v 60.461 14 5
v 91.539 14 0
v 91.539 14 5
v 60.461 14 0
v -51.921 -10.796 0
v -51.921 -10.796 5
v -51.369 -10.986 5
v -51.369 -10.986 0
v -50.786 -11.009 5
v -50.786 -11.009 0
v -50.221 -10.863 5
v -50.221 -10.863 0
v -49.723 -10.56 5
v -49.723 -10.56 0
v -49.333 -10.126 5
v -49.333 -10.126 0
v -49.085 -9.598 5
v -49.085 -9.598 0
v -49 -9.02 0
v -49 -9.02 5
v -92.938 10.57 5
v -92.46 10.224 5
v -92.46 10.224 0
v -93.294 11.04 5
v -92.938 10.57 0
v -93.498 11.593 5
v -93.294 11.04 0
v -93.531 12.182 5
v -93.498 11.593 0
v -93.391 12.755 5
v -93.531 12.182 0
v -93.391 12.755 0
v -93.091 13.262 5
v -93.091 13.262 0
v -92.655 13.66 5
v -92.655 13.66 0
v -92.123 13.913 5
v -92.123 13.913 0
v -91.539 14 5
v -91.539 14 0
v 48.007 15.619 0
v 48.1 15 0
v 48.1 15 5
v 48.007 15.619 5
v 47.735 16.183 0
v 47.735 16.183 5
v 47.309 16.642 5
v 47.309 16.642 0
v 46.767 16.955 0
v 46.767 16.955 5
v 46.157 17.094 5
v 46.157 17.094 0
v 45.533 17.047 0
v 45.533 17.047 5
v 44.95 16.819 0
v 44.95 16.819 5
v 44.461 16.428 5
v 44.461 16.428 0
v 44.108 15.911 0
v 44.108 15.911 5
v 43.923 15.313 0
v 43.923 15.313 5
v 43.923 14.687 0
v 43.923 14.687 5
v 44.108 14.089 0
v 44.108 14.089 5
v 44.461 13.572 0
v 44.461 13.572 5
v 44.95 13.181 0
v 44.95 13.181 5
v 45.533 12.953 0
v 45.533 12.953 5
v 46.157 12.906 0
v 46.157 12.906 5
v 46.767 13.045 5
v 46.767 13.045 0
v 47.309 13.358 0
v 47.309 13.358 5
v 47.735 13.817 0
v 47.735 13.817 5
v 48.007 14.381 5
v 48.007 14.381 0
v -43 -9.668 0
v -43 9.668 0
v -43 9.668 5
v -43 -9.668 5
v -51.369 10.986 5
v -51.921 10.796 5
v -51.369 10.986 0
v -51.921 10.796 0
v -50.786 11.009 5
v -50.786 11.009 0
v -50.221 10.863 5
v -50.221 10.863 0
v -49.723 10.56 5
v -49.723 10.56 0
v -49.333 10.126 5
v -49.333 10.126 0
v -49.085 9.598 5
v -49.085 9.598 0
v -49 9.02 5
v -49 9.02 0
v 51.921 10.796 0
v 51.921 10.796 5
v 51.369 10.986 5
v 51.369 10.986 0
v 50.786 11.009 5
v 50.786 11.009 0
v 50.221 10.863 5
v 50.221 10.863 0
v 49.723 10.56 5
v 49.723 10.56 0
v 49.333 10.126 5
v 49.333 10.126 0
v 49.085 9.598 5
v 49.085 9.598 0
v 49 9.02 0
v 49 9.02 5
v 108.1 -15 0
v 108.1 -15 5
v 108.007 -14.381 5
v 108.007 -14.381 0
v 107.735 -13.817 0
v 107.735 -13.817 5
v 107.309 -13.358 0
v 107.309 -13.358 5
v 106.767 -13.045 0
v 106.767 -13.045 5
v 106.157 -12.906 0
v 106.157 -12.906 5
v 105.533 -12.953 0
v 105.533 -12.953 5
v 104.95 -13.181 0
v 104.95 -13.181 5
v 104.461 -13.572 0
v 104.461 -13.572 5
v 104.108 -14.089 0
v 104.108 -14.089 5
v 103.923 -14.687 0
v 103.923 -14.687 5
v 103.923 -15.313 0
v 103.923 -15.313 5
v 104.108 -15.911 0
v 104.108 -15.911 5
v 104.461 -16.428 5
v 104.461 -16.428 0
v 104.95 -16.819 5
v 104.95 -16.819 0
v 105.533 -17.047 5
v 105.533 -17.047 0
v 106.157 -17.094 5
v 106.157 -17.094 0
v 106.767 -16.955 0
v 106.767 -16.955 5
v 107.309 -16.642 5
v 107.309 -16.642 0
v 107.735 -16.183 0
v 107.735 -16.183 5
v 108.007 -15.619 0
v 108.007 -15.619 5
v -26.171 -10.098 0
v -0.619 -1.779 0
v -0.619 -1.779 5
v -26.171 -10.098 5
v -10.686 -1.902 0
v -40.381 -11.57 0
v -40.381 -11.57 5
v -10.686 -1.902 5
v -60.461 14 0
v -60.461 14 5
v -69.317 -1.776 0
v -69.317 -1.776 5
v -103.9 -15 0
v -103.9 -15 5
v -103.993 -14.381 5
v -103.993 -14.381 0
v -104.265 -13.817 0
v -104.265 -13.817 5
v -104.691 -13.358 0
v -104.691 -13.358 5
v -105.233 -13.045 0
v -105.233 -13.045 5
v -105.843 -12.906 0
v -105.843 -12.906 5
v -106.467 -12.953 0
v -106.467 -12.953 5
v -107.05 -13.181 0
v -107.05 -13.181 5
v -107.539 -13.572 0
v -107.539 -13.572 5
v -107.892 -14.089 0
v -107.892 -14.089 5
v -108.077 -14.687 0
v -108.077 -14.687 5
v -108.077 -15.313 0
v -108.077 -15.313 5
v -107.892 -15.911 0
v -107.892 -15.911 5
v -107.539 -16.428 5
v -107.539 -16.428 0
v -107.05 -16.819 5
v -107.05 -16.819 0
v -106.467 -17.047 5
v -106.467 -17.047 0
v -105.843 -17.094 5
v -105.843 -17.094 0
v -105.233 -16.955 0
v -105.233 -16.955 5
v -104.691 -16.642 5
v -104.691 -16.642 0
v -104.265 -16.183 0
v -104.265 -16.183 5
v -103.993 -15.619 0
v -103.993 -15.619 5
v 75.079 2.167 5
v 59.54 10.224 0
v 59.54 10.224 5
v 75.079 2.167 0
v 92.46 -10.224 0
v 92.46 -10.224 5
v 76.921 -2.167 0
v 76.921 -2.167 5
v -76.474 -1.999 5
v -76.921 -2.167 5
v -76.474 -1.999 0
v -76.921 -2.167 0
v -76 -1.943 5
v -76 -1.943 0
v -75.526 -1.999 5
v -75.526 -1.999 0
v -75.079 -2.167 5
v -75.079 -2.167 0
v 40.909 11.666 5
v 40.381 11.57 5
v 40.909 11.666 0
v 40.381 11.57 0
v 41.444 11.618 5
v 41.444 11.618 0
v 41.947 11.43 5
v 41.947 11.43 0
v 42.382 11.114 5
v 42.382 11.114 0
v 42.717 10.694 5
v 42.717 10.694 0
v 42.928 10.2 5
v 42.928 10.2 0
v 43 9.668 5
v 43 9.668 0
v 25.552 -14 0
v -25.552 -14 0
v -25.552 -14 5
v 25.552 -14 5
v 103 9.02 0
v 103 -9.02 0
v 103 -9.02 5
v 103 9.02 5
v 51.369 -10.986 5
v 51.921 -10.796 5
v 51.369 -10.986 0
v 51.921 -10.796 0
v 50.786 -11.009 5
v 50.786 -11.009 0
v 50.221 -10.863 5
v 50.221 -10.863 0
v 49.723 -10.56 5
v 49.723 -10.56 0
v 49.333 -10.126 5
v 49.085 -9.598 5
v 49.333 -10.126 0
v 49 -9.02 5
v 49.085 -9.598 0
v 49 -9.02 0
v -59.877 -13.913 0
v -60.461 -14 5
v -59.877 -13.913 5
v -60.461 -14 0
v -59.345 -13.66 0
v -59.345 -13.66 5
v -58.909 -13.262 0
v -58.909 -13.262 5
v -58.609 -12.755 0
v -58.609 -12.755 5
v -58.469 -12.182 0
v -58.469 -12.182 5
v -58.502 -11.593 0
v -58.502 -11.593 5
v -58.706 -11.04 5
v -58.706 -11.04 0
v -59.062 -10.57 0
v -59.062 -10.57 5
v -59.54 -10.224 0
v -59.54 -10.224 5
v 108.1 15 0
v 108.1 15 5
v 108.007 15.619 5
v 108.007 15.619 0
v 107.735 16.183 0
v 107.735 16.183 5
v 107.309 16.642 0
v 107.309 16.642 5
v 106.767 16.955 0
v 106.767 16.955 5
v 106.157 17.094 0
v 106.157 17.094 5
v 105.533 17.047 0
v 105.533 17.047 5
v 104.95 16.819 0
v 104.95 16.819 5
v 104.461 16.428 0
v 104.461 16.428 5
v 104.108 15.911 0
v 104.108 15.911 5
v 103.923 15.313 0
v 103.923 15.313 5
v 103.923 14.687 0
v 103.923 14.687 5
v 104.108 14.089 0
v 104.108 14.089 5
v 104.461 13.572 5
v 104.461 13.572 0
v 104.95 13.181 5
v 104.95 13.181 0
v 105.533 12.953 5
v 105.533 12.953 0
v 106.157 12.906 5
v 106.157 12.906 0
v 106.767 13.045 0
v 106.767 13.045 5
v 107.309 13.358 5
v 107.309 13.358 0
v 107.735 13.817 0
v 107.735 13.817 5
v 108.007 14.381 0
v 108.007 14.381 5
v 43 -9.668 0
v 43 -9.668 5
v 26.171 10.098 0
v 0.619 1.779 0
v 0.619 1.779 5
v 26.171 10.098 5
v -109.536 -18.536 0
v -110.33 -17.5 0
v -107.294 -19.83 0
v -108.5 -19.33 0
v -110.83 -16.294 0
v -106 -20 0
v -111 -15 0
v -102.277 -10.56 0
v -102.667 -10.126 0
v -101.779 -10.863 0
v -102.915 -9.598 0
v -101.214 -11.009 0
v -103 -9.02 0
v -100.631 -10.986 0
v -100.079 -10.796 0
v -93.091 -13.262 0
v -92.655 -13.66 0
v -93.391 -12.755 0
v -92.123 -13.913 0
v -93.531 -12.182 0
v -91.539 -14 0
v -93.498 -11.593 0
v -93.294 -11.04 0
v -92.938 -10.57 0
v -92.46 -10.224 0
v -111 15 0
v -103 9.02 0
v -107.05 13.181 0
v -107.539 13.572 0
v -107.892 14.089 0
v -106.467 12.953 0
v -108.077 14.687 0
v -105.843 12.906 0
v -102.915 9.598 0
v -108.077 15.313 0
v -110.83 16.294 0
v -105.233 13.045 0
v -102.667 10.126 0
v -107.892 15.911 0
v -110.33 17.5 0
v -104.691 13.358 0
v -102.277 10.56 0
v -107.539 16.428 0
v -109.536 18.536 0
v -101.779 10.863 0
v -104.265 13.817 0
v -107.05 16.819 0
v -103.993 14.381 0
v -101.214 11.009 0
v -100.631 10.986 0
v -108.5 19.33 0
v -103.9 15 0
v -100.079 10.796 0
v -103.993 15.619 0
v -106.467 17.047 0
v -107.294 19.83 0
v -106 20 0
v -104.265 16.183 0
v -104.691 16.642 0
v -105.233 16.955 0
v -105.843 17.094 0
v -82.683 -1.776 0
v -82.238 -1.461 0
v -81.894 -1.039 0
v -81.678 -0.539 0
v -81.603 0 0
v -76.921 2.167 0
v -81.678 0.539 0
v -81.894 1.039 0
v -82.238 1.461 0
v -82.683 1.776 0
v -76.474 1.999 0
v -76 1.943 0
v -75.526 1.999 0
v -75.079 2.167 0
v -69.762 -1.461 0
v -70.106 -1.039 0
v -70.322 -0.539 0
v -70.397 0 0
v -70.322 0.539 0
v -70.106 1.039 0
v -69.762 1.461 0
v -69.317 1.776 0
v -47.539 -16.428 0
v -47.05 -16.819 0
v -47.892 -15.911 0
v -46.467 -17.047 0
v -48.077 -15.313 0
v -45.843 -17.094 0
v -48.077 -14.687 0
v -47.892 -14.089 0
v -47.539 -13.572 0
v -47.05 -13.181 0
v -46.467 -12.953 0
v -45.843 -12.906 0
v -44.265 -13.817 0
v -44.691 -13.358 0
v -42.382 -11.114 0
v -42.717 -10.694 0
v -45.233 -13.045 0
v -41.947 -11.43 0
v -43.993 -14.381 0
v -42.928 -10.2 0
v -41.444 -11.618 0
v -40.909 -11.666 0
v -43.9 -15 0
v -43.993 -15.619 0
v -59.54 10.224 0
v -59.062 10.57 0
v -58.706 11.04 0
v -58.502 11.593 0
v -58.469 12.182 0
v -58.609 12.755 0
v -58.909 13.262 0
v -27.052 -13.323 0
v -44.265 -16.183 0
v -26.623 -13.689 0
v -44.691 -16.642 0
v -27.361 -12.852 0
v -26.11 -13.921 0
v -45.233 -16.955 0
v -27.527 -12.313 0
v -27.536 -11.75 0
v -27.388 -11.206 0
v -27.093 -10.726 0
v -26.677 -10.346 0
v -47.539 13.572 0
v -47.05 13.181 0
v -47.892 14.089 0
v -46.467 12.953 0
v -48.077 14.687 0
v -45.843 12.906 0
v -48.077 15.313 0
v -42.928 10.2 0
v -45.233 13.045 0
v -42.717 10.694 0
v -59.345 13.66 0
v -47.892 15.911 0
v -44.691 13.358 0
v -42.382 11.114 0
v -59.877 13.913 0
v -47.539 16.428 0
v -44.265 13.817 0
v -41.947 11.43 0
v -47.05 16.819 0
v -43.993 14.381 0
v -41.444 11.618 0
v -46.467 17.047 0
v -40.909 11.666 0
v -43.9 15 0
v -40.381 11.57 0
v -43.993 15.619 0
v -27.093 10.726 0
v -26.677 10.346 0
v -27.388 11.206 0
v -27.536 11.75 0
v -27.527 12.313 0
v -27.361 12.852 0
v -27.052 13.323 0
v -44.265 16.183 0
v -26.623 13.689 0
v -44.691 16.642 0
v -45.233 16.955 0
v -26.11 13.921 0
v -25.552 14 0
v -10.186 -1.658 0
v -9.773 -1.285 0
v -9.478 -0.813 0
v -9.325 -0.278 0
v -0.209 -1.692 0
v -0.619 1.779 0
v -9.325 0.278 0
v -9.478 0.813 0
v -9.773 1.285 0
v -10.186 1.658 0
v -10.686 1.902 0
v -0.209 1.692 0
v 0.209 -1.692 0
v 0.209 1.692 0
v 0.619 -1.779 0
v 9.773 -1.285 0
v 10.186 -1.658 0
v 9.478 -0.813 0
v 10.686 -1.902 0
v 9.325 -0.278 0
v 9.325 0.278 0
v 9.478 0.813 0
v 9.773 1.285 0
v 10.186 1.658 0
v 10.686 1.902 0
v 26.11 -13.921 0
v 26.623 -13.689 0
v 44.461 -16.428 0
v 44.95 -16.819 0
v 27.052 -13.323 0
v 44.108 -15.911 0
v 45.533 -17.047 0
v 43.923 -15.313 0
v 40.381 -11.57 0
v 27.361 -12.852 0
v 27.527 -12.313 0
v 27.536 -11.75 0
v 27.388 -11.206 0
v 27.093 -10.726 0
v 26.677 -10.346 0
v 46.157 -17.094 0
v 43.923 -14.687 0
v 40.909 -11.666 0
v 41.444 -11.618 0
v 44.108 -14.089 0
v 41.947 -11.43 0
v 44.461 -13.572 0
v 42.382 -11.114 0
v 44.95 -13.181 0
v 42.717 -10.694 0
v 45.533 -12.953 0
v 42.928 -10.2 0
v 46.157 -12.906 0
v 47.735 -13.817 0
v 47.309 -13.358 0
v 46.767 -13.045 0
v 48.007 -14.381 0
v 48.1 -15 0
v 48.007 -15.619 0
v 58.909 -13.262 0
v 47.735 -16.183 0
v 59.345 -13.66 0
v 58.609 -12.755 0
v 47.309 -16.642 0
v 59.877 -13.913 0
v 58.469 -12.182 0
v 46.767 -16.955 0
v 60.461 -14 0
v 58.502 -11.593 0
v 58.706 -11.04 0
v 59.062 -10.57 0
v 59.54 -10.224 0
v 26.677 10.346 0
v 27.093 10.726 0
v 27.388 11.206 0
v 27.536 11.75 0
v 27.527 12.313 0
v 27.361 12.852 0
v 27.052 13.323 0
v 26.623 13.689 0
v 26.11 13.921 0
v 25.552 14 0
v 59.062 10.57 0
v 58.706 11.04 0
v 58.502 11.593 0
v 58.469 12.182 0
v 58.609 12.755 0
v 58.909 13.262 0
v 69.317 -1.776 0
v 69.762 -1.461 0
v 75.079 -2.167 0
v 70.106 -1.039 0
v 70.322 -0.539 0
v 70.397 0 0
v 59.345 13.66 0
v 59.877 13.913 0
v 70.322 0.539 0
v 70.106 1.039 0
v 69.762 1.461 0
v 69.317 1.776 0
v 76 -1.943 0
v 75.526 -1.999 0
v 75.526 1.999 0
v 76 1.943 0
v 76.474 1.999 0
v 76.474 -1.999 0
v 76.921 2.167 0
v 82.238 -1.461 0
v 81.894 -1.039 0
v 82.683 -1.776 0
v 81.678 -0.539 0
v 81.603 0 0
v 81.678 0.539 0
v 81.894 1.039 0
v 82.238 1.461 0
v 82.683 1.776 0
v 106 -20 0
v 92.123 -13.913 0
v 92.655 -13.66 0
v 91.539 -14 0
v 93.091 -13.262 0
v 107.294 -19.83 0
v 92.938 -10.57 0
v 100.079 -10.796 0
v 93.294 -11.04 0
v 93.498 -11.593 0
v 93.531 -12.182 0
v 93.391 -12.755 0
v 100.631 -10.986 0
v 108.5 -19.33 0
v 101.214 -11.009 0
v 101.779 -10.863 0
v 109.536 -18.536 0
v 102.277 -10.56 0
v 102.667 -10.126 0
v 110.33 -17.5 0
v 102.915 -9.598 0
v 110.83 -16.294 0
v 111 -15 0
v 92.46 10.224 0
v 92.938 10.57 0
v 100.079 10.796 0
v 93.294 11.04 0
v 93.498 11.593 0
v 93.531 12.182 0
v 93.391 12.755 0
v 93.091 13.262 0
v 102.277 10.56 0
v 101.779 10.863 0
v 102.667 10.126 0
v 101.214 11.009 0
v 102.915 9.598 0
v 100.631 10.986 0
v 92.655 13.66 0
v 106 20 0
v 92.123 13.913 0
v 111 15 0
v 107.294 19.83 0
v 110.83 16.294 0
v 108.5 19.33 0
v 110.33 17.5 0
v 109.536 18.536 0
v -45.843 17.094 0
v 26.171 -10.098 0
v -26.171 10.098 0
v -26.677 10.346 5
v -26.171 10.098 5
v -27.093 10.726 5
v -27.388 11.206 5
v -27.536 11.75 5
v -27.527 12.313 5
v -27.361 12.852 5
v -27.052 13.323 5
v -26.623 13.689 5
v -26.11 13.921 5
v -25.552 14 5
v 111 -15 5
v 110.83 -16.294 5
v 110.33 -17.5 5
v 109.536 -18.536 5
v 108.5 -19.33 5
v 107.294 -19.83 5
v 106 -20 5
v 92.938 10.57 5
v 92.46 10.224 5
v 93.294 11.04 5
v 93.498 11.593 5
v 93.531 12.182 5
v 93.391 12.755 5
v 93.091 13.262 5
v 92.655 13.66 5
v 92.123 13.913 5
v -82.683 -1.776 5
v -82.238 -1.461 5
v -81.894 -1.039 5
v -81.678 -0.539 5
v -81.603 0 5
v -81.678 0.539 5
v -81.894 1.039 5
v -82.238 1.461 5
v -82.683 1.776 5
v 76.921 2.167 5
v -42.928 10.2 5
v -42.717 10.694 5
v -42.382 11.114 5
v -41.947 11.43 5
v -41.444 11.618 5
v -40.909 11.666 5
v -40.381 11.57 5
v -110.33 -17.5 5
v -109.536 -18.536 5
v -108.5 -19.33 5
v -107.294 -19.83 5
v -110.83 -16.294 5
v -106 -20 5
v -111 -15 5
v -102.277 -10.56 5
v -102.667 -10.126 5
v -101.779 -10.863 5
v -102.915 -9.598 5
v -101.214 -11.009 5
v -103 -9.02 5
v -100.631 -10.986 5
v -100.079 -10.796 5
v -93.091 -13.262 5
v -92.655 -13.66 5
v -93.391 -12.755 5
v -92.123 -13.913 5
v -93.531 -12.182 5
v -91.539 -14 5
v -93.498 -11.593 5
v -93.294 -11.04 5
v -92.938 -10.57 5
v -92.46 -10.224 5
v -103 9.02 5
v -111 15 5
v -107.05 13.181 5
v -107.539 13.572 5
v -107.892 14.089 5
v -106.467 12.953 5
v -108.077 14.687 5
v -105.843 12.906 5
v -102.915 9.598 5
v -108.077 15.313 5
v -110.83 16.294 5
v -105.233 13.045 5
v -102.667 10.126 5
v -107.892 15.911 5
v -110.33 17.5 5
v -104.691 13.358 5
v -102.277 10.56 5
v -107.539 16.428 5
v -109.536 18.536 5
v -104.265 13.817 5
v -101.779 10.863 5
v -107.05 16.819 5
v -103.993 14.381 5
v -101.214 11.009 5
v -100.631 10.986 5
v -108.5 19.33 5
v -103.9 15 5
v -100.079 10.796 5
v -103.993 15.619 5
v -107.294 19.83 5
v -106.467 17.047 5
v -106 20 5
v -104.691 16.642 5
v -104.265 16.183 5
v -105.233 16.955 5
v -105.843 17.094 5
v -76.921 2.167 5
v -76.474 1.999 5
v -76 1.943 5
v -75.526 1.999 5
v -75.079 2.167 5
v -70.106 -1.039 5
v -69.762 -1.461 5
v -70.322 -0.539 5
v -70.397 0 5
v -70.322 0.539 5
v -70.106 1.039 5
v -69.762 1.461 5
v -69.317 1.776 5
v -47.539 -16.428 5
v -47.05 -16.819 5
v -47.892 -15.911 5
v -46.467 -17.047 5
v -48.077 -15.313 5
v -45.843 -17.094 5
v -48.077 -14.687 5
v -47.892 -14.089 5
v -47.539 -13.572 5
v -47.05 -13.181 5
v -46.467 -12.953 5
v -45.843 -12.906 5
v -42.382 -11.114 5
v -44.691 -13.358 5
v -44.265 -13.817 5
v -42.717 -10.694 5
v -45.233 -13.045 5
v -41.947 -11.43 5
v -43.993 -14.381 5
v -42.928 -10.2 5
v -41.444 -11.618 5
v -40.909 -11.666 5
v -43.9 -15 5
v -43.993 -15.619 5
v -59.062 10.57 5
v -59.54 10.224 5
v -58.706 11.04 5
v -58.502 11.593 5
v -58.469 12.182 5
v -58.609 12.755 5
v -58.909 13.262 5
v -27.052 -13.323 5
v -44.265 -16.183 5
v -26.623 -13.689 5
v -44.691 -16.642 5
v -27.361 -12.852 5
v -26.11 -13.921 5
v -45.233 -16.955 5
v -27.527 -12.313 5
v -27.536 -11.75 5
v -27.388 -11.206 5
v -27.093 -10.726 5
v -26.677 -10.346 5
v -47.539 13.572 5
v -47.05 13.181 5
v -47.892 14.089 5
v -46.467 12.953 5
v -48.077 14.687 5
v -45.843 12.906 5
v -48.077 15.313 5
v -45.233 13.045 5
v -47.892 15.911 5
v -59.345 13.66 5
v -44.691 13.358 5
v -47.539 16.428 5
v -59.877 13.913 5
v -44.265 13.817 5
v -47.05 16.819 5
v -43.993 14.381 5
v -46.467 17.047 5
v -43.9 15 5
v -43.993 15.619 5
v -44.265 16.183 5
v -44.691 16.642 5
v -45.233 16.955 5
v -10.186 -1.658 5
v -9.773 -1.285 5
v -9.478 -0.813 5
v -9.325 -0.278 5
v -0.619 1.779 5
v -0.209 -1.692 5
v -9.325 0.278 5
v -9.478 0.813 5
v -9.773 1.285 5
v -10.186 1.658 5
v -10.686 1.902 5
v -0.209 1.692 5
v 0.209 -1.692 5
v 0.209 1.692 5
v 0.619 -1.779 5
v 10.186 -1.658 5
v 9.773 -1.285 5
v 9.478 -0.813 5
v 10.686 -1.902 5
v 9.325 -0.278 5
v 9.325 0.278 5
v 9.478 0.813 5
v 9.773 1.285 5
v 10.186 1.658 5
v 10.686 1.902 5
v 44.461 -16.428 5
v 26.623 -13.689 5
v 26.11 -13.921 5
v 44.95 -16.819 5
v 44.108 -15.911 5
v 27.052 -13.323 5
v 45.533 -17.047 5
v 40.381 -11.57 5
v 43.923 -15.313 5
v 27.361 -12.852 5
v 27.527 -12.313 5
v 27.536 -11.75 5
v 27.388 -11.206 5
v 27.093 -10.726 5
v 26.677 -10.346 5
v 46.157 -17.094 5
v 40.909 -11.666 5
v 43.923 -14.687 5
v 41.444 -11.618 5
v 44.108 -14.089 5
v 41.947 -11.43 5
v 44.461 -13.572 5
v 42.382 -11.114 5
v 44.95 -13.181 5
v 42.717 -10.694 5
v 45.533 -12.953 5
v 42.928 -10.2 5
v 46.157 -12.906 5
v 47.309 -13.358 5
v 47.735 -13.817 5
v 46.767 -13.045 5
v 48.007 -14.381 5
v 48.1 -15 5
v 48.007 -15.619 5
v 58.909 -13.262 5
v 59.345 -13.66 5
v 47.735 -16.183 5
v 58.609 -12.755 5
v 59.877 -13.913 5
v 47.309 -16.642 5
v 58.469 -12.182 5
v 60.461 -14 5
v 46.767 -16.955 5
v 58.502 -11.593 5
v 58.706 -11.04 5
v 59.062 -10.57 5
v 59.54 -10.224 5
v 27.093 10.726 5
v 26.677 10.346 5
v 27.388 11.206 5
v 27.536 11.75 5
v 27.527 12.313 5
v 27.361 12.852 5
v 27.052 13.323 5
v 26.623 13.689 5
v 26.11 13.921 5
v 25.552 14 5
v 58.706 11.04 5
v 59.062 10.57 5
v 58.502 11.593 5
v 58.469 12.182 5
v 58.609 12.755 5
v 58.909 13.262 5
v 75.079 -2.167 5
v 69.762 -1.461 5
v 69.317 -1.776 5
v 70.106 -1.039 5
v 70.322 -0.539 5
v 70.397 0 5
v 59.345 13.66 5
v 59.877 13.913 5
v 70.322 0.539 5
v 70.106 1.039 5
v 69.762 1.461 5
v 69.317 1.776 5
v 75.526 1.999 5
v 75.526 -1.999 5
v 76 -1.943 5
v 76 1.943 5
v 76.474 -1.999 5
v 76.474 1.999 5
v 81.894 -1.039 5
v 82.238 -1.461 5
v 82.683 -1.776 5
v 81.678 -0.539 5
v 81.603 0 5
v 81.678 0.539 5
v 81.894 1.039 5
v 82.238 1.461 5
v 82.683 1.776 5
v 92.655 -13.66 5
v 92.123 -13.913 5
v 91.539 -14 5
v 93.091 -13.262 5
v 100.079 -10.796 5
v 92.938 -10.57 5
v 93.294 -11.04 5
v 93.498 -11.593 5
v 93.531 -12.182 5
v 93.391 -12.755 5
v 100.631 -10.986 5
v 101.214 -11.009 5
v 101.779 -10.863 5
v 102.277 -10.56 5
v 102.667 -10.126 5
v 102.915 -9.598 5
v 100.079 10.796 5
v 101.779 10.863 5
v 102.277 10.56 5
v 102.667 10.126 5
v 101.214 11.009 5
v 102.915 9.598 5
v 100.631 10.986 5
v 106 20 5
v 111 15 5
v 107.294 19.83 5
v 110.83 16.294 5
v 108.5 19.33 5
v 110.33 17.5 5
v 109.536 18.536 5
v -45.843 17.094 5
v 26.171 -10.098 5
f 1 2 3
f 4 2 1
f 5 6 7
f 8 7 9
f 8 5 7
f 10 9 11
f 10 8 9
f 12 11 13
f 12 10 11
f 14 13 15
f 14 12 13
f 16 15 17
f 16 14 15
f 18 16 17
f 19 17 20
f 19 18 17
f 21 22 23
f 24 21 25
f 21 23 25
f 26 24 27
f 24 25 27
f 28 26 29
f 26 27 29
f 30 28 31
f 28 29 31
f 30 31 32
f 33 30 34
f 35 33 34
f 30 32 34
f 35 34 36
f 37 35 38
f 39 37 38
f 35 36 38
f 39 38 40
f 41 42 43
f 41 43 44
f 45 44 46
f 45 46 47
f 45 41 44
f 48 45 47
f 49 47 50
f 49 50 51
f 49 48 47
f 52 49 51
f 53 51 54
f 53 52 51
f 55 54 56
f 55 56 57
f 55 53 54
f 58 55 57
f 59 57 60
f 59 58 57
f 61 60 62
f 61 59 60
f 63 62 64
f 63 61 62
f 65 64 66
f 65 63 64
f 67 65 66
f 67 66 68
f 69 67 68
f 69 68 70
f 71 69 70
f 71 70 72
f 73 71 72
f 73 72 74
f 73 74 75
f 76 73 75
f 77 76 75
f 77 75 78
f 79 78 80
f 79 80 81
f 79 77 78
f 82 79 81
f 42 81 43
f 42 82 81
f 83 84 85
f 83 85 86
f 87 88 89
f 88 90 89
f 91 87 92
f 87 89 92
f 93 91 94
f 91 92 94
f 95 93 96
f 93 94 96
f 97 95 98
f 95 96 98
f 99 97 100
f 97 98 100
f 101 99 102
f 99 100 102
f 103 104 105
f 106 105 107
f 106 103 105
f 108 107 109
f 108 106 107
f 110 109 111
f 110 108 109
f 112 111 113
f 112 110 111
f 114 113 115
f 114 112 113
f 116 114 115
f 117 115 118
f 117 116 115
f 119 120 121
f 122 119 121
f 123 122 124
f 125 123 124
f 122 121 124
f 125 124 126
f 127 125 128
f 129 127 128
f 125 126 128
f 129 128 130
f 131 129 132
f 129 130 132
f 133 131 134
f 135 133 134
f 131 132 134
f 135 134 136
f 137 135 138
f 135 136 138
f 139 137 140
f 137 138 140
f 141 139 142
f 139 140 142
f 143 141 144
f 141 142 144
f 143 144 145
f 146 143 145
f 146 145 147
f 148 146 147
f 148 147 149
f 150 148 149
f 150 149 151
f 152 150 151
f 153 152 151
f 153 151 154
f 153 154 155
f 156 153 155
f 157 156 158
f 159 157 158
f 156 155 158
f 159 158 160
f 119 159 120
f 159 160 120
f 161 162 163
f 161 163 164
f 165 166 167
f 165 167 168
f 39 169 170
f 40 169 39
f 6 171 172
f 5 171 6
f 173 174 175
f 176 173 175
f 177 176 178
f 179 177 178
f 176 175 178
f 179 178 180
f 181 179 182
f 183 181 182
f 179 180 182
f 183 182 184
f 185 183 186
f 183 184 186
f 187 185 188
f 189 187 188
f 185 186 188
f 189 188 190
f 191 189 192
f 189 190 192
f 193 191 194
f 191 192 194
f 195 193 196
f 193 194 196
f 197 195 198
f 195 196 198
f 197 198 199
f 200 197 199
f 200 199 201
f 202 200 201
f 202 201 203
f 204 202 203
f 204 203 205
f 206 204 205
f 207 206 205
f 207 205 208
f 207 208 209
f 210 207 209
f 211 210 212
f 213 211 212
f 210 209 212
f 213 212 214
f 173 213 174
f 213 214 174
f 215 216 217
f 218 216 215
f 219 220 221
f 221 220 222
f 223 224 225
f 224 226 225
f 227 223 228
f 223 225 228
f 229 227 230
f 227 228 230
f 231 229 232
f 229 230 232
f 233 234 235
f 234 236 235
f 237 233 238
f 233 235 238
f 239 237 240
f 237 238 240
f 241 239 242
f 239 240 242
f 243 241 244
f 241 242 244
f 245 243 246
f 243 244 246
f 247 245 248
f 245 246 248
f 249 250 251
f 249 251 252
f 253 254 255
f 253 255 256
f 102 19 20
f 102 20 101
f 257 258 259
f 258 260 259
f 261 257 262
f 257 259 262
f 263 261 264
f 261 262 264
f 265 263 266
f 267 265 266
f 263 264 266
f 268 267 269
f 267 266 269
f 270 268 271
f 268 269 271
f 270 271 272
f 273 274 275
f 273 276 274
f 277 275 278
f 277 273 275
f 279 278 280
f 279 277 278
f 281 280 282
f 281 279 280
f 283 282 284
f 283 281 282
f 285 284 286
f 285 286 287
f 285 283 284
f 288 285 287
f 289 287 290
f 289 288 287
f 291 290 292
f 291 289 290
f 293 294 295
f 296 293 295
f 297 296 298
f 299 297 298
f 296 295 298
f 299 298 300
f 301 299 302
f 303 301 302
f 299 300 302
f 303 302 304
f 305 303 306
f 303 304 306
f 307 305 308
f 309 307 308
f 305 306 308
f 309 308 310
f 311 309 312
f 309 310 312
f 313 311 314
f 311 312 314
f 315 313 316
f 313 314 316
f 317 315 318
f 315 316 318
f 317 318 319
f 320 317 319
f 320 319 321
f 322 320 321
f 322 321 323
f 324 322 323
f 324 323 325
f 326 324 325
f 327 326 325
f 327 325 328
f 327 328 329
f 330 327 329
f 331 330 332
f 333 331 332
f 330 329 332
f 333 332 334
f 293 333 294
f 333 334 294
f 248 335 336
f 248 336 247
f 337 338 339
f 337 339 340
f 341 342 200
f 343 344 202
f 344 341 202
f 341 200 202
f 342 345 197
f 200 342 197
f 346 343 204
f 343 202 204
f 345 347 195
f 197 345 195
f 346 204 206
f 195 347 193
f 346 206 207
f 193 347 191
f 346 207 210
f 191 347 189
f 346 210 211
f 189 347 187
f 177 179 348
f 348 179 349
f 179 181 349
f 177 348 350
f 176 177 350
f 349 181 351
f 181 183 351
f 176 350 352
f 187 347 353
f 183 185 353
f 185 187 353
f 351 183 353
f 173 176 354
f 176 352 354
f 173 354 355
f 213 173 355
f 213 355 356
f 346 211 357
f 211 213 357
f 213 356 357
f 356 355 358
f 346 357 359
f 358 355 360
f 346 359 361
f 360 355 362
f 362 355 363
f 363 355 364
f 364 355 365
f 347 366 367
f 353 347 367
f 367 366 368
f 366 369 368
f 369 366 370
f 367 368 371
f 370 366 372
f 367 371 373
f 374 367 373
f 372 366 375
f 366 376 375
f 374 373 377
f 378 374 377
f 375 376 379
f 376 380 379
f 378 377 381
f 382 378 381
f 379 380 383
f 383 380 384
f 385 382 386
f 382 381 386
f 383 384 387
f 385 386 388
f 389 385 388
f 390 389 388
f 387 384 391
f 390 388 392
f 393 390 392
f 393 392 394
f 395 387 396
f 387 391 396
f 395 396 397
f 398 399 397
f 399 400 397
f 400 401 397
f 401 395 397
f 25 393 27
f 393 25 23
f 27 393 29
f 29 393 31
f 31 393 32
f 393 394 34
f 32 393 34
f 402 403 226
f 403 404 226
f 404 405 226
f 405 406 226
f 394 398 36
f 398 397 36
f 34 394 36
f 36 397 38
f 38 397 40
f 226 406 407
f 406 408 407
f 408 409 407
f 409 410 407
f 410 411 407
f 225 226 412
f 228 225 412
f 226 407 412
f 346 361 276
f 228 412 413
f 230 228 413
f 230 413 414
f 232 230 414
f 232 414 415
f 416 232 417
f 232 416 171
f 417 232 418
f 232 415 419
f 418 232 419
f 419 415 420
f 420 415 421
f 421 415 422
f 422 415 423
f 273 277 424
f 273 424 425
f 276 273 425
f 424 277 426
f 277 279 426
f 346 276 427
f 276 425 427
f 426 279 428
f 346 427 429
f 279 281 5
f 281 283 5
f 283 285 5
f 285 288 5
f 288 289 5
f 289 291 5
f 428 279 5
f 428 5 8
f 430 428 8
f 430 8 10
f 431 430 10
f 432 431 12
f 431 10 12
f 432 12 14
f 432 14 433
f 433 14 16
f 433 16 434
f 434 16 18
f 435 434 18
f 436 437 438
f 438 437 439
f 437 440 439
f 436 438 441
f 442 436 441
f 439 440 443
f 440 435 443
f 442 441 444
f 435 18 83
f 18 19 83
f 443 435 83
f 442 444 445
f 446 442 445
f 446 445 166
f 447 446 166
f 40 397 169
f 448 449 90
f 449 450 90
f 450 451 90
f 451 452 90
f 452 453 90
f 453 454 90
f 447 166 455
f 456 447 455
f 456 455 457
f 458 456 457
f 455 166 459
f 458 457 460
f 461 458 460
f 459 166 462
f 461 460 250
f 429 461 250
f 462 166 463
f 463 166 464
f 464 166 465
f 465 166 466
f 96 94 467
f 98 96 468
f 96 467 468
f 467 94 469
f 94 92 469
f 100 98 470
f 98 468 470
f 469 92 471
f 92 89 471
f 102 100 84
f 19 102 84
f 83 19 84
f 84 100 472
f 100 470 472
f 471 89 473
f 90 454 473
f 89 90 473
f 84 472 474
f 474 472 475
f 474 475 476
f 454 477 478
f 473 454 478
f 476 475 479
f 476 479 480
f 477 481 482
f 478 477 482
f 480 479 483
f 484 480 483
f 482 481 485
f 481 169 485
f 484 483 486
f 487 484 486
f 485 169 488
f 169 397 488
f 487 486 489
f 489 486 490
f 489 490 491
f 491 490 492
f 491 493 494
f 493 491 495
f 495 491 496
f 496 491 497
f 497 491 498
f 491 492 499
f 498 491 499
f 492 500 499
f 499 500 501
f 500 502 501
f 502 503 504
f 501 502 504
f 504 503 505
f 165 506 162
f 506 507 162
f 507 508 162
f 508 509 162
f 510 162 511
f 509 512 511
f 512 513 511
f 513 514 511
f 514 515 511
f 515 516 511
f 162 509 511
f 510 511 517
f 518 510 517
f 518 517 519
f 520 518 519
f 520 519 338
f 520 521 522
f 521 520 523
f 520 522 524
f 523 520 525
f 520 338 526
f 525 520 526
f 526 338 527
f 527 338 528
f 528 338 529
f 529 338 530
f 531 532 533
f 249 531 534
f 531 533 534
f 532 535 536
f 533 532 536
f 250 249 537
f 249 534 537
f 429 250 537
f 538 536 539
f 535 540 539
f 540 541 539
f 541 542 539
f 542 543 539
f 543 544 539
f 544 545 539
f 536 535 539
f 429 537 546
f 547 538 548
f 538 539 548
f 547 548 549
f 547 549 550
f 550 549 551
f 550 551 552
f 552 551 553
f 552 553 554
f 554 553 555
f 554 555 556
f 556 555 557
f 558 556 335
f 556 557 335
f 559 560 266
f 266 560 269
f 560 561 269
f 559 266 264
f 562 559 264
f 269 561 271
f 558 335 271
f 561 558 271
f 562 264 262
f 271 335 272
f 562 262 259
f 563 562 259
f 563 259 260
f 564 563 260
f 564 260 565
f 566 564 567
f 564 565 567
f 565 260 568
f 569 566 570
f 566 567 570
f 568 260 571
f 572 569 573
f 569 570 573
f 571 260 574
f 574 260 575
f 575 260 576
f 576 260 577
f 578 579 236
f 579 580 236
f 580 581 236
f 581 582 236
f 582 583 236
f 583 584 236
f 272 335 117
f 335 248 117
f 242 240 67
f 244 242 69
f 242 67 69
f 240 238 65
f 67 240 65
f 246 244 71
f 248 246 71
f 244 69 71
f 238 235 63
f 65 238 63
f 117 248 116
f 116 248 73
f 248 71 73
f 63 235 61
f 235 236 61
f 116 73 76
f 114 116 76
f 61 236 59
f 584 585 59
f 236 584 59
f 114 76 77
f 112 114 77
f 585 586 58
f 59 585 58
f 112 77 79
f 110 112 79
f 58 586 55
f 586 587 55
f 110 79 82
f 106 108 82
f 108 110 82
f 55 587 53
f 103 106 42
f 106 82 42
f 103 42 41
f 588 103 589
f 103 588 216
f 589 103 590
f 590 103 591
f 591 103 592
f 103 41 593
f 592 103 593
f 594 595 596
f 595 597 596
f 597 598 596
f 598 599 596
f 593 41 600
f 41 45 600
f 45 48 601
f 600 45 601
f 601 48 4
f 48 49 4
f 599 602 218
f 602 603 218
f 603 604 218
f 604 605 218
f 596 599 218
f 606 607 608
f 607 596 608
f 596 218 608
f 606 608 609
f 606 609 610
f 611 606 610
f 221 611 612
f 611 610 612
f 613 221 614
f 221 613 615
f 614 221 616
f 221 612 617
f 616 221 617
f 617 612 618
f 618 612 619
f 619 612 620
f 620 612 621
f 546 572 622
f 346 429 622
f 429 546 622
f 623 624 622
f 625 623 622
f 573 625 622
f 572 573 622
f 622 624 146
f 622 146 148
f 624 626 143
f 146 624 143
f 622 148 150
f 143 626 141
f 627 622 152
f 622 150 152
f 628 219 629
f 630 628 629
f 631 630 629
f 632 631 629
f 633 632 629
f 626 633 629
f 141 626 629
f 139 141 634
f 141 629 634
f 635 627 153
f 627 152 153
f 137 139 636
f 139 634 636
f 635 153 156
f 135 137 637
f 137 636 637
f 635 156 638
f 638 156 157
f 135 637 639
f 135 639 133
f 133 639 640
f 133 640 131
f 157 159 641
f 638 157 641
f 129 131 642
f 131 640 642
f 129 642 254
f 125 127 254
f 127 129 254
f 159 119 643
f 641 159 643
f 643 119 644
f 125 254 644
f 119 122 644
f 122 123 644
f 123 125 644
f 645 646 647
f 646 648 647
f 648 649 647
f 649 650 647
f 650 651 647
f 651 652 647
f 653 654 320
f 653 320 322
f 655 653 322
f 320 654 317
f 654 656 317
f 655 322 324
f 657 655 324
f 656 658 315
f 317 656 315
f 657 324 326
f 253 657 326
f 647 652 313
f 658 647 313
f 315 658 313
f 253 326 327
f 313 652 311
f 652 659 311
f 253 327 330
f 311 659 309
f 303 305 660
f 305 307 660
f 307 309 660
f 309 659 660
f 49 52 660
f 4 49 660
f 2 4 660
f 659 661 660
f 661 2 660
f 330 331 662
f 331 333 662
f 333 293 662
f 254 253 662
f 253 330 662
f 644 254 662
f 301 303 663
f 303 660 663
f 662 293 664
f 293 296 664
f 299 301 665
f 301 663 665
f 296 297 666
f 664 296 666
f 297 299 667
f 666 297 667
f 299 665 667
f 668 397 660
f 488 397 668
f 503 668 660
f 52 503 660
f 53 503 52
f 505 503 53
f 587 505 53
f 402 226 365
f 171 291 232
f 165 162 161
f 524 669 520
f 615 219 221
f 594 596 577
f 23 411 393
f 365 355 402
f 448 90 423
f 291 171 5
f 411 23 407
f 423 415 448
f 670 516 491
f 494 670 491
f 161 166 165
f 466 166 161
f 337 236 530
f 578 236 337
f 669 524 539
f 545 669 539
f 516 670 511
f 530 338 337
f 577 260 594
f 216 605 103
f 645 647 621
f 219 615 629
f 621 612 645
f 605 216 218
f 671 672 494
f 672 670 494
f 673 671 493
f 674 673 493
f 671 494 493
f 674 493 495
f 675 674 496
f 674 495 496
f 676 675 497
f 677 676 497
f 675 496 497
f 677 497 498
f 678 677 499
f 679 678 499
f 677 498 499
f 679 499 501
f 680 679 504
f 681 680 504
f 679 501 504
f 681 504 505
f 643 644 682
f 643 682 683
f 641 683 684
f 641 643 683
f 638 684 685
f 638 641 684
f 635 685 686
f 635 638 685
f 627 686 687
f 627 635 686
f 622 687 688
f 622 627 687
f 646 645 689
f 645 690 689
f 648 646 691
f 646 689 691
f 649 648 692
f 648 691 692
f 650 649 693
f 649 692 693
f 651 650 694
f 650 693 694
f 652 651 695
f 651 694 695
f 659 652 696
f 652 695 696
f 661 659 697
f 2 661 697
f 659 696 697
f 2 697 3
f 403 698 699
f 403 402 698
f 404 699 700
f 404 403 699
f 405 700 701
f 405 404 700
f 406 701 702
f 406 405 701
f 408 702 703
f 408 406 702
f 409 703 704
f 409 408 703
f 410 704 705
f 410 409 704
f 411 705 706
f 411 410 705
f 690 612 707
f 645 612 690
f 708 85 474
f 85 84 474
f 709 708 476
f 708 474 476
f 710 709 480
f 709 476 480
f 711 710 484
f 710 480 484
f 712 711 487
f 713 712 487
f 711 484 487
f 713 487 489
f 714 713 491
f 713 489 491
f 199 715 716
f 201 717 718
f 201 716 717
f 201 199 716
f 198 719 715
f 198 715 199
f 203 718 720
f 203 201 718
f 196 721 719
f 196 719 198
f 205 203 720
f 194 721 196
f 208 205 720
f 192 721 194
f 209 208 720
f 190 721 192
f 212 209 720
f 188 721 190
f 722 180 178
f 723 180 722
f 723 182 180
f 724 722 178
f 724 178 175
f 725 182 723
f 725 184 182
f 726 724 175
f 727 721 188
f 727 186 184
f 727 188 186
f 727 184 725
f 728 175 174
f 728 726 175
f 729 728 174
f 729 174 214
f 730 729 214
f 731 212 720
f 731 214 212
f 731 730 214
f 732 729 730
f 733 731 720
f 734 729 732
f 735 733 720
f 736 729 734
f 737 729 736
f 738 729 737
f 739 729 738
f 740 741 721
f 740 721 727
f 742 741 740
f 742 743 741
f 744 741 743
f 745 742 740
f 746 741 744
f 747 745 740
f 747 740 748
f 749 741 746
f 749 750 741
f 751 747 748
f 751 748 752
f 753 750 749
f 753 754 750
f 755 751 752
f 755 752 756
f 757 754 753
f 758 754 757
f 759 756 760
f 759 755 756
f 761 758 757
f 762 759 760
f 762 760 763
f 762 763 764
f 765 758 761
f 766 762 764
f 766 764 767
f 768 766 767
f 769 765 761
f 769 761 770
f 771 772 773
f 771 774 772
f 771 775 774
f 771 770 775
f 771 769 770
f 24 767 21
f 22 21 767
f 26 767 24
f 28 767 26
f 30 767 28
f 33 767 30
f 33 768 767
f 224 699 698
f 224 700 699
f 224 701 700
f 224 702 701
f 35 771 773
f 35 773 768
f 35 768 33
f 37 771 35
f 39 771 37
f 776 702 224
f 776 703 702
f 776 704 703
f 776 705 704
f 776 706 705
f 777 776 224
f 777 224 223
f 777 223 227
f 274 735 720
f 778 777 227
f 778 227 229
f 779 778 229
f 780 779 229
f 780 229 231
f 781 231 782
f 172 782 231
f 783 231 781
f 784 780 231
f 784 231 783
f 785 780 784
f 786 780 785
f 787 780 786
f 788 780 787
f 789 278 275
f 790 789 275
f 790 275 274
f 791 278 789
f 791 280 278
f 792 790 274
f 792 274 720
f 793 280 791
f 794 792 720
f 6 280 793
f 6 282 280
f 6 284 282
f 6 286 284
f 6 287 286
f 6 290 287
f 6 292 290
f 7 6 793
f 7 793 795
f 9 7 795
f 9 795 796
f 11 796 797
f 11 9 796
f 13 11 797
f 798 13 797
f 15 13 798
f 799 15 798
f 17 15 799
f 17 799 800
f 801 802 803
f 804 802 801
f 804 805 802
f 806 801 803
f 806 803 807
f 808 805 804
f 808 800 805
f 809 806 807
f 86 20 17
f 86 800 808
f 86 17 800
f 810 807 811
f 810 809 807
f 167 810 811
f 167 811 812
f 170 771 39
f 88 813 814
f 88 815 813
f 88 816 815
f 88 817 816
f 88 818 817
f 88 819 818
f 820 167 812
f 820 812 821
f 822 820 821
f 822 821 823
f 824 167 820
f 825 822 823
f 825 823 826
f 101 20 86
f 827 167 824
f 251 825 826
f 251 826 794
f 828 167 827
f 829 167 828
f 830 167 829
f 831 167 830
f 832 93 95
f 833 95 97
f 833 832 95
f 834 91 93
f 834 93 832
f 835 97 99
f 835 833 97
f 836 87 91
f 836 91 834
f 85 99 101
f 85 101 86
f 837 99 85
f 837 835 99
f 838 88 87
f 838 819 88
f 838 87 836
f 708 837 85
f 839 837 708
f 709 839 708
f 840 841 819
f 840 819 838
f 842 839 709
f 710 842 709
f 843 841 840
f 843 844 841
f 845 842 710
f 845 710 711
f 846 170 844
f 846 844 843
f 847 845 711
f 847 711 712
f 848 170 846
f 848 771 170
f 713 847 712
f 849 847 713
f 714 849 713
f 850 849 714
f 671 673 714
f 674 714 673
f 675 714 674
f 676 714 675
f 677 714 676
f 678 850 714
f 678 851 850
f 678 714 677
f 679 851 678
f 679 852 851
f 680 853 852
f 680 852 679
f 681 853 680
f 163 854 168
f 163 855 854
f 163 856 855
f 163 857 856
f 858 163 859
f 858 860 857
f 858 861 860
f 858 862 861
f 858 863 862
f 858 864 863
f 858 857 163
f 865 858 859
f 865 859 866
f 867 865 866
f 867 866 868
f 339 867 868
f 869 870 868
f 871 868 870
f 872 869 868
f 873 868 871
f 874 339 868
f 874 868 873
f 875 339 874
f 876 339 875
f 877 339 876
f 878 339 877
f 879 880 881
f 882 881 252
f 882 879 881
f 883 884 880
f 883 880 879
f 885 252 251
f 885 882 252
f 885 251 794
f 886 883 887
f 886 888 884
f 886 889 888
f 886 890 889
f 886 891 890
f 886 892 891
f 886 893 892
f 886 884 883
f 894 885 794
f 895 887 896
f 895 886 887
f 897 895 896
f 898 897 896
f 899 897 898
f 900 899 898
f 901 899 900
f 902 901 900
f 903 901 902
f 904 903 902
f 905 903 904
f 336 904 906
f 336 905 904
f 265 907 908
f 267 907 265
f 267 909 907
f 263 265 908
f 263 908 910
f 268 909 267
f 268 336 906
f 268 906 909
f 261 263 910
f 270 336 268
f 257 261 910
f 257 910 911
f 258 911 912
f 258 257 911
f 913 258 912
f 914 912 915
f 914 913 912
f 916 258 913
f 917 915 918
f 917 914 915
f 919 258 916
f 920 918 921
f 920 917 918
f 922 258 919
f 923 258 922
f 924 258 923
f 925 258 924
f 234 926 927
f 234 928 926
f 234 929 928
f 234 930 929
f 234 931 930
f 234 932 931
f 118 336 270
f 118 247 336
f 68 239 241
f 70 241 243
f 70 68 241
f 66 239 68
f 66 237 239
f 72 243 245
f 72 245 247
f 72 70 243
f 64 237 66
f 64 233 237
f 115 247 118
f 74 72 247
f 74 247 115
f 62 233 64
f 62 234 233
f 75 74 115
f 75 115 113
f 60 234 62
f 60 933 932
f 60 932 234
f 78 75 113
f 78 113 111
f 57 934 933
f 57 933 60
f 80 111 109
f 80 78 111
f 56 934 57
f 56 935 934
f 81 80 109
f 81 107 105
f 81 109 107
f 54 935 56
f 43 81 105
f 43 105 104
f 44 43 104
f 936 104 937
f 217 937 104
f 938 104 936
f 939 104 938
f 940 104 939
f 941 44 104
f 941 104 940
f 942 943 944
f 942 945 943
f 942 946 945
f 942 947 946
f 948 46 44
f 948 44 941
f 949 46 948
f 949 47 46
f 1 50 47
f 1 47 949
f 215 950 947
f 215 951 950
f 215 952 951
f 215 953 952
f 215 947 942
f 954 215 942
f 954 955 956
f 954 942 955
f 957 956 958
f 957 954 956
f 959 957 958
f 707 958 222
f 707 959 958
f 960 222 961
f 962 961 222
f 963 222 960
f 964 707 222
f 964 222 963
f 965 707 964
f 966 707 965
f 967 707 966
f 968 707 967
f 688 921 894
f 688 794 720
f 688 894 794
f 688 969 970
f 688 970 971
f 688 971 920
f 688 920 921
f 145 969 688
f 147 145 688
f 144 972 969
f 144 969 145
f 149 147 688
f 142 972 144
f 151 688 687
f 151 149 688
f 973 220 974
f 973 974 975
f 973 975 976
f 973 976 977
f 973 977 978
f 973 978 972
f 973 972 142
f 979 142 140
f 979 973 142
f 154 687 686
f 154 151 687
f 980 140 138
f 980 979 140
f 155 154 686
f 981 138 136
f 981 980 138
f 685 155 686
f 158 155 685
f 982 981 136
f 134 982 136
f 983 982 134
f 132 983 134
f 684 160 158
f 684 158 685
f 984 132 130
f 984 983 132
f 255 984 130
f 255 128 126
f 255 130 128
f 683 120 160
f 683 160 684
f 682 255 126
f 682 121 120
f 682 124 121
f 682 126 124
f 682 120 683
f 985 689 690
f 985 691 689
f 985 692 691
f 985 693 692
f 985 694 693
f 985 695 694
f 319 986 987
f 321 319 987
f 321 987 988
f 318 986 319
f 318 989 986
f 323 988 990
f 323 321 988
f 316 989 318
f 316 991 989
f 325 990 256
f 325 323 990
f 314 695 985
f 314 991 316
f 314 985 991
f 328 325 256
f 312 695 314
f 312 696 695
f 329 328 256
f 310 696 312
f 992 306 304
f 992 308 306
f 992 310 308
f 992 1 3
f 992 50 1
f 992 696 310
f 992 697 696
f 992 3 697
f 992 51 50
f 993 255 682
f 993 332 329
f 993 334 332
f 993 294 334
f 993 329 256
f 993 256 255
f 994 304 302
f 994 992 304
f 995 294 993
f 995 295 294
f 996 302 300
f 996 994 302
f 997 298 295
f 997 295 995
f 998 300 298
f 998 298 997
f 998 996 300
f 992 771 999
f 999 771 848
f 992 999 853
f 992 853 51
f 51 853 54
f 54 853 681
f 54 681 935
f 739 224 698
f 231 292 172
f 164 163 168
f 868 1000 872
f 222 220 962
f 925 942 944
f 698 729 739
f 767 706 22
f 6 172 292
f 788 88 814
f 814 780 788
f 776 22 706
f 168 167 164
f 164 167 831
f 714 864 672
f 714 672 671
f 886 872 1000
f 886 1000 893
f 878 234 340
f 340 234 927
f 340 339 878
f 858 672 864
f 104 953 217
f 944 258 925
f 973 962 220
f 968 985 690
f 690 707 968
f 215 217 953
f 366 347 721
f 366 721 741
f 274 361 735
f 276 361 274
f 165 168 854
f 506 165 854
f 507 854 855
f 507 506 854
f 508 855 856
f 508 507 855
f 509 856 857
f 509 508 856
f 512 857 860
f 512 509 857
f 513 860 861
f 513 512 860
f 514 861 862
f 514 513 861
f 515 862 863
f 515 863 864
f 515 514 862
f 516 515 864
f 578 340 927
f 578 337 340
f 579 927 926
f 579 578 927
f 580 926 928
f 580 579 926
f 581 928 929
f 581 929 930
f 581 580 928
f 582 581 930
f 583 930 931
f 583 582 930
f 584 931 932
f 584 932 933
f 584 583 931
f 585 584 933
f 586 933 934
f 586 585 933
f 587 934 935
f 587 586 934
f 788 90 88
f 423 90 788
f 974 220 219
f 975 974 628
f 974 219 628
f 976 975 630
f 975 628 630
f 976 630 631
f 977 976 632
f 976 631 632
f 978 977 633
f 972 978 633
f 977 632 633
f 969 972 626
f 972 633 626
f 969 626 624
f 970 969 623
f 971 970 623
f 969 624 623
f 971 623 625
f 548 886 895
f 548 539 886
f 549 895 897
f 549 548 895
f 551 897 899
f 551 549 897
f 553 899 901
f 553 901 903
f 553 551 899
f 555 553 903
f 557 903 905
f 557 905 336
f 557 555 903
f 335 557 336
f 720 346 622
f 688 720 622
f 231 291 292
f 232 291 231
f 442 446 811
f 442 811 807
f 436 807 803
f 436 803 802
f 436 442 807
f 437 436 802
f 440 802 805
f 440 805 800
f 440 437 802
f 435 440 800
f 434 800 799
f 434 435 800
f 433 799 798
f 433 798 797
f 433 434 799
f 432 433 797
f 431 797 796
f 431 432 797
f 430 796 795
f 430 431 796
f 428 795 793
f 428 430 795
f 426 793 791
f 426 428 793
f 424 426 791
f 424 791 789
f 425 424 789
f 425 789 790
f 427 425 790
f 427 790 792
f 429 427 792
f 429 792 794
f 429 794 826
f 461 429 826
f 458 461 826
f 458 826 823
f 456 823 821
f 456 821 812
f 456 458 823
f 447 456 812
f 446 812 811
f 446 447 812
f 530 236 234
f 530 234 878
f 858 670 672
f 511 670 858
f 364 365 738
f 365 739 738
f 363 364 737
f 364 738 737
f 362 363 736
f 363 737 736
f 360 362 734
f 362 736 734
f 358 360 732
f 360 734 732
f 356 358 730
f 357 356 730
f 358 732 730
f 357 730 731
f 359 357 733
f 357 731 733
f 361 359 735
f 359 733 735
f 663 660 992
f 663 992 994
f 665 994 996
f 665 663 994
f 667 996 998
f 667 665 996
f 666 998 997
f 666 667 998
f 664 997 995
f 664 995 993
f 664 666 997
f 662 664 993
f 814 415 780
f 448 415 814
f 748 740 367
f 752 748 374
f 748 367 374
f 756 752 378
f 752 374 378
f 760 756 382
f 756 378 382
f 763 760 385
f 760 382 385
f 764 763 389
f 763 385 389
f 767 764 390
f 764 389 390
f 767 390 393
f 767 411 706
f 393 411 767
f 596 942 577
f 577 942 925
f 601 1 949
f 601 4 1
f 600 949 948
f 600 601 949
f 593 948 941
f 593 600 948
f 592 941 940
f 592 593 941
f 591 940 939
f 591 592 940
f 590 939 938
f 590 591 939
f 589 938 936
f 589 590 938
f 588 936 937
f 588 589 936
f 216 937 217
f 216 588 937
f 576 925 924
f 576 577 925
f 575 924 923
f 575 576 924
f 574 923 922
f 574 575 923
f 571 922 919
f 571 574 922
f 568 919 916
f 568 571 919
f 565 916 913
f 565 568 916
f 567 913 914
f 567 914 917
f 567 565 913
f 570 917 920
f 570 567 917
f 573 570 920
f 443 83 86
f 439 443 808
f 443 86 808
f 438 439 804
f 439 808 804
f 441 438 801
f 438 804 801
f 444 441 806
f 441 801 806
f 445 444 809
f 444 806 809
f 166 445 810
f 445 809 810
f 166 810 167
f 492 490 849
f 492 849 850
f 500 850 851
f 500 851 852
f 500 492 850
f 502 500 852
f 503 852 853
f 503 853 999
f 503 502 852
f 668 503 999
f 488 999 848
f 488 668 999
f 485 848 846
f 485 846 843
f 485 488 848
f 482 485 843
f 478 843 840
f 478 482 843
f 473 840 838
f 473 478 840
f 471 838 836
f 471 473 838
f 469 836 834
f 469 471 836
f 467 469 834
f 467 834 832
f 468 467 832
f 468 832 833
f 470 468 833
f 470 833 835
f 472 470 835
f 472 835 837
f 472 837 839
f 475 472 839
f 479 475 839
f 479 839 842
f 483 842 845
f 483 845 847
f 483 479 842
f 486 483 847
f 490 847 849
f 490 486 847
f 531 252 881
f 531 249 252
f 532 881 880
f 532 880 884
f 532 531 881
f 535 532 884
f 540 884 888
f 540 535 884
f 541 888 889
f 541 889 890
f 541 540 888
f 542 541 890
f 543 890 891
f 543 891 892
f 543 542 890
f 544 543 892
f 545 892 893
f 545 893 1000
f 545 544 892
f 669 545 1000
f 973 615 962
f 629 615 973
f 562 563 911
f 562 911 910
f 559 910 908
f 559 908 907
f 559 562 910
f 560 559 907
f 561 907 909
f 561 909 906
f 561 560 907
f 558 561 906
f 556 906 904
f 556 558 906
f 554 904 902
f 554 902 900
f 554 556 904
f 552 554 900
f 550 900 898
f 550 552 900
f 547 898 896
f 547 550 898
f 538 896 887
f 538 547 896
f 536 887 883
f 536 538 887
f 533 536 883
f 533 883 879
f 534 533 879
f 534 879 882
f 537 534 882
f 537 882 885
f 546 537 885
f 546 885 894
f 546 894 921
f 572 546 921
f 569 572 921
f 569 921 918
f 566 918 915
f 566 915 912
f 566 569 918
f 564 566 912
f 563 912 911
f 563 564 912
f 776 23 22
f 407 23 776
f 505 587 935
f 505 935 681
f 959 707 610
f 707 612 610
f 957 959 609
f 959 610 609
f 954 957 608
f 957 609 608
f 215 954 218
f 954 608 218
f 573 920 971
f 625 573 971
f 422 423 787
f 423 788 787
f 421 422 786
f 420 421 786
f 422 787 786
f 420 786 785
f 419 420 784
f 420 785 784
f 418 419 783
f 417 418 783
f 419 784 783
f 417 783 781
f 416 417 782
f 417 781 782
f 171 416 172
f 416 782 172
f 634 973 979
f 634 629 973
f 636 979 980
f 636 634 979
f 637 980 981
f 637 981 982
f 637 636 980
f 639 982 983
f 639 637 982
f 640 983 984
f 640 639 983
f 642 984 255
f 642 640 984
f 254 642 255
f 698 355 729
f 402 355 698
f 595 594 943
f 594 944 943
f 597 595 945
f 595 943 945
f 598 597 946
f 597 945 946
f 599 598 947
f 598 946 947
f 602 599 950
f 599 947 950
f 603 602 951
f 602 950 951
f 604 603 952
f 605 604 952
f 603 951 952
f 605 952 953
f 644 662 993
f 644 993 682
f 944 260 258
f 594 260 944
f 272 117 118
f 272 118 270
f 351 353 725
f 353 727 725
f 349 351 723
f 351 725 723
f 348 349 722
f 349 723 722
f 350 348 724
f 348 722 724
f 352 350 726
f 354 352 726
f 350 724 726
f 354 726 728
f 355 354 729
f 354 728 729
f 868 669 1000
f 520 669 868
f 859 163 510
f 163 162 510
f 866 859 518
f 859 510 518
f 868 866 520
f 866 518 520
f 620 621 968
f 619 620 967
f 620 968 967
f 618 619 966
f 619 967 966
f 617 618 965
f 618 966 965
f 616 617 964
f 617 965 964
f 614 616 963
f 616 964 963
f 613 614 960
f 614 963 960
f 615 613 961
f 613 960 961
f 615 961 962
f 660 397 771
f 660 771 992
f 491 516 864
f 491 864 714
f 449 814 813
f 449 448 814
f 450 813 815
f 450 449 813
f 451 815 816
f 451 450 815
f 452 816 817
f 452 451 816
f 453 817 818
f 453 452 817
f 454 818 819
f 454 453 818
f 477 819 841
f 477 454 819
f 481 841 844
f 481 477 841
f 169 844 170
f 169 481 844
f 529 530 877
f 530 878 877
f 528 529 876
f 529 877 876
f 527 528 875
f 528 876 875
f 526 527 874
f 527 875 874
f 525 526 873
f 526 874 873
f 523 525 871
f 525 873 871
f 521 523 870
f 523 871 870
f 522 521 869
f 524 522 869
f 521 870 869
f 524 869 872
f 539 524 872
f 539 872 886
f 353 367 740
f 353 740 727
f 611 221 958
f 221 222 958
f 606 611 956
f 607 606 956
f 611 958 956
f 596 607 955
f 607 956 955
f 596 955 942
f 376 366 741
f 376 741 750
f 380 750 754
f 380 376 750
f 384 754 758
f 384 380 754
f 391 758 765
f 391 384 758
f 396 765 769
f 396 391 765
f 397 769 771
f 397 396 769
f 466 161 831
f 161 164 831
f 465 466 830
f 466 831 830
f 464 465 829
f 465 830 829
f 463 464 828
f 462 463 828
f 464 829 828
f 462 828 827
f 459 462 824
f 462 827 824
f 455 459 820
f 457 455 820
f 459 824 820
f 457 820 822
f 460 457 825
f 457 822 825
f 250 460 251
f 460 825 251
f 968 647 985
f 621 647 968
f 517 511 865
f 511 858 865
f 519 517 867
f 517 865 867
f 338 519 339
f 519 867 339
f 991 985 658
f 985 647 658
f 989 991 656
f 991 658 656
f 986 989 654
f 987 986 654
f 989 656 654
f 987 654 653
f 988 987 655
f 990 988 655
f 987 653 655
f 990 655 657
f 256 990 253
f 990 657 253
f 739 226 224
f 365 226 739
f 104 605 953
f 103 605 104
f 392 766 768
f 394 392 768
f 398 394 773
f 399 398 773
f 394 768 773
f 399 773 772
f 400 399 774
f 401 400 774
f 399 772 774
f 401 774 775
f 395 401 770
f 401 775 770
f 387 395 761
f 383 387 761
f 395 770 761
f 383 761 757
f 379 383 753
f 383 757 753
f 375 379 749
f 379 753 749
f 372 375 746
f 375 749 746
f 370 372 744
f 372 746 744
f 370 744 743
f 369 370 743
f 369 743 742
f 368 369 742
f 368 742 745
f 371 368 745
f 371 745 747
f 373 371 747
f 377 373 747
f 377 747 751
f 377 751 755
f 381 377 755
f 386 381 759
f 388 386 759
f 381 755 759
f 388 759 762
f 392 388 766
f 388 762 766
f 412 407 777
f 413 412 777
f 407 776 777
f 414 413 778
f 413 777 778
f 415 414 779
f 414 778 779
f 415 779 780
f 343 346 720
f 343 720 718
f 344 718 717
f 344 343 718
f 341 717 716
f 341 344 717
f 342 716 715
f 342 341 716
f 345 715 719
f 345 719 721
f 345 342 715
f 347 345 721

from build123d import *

# Parameters (mm, degrees)
SKETCH_1_W          = 232
SKETCH_1_H          = 40
SKETCH_1_R          = 2.1
EXTRUDE_2_DEPTH     = 5
SKETCH_3_R          = 2.1
CUT_EXTRUDE_2_DEPTH = 5
CUT_EXTRUDE_4_DEPTH = 5
FILLET_1_R          = 2


with BuildPart() as part:
    # 草图1 → 凸台-拉伸2 (new body)
    with BuildSketch(Plane.XY):
        Rectangle(SKETCH_1_W, SKETCH_1_H)
        with Locations((-46, 15)):
            Circle(SKETCH_1_R, mode=Mode.SUBTRACT)
        with Locations((46, 15)):
            Circle(SKETCH_1_R, mode=Mode.SUBTRACT)
        with Locations((46, -15)):
            Circle(SKETCH_1_R, mode=Mode.SUBTRACT)
        with Locations((-46, -15)):
            Circle(SKETCH_1_R, mode=Mode.SUBTRACT)
    extrude(amount=EXTRUDE_2_DEPTH)

    # 草图3 → 切除-拉伸2 (cut, symmetric)
    with BuildSketch(Plane.XY.offset(5)):
        with BuildLine():
            Line((-111, -15), (-111, 15))
            ThreePointArc((-111, 15), (-109.535533906, 18.535533906), (-106, 20))
            Line((-106, 20), (-116, 20))
            Line((-116, 20), (-116, -20))
            Line((-116, -20), (-106, -20))
            ThreePointArc((-106, -20), (-109.535533906, -18.535533906), (-111, -15))
        make_face()
        with Locations((-106, 15)):
            Circle(SKETCH_3_R)
        with Locations((-106, -15)):
            Circle(SKETCH_3_R)
        with BuildLine():
            Line((116, 20), (106, 20))
            ThreePointArc((106, 20), (109.535533906, 18.535533906), (111, 15))
            Line((111, 15), (111, -15))
            ThreePointArc((111, -15), (109.535533906, -18.535533906), (106, -20))
            Line((106, -20), (116, -20))
            Line((116, -20), (116, 20))
        make_face()
        with Locations((106, 15)):
            Circle(SKETCH_3_R)
        with Locations((106, -15)):
            Circle(SKETCH_3_R)
    extrude(amount=CUT_EXTRUDE_2_DEPTH, both=True, mode=Mode.SUBTRACT)

    # 草图4 → 切除-拉伸4 (cut, symmetric)
    with BuildSketch(Plane.XY.offset(5)):
        Polygon((-99.741377216, 14), (-76, 1.689656258), (-52.258622784, 14), align=None)
        Polygon((-103, 12.310343742), (-103, -12.310343742), (-79.258622784, 0), align=None)
        Polygon((-49, 12.310343742), (-72.741377216, 0), (-49, -12.310343742), align=None)
        Polygon((-76, -1.689656258), (-99.741377216, -14), (-52.258622784, -14), align=None)
        Polygon((-43, 12.422499667), (-43, -12.422499667), (-4.845179595, 0), align=None)
        Polygon((-38.154820405, 14), (0, 1.577500333), (38.154820405, 14), align=None)
        Polygon((43, 12.422499667), (4.845179595, 0), (43, -12.422499667), align=None)
        Polygon((0, -1.577500333), (-38.154820405, -14), (38.154820405, -14), align=None)
        Polygon((49, -12.310343742), (72.741377216, 0), (49, 12.310343742), align=None)
        Polygon((76, 1.689656258), (99.741377216, 14), (52.258622784, 14), align=None)
        Polygon((103, 12.310343742), (79.258622784, 0), (103, -12.310343742), align=None)
        Polygon((99.741377216, -14), (76, -1.689656258), (52.258622784, -14), align=None)
    extrude(amount=CUT_EXTRUDE_4_DEPTH, both=True, mode=Mode.SUBTRACT)

    # 圆角1
    fillet_1_edges = [part.edges().sort_by_distance(p)[0] for p in [
        (4.845179595, 0, 2.5),
        (43, 12.422499667, 2.5),
        (43, -12.422499667, 2.5),
        (0, 1.577500333, 2.5),
        (-38.154820405, 14, 2.5),
        (38.154820405, 14, 2.5),
        (-38.154820405, -14, 2.5),
        (0, -1.577500333, 2.5),
        (38.154820405, -14, 2.5),
        (49, -12.310343742, 2.5),
        (49, 12.310343742, 2.5),
        (72.741377216, 0, 2.5),
        (-103, -12.310343742, 2.5),
        (-103, 12.310343742, 2.5),
        (-79.258622784, 0, 2.5),
        (-72.741377216, 0, 2.5),
        (-49, 12.310343742, 2.5),
        (-49, -12.310343742, 2.5),
        (-76, -1.689656258, 2.5),
        (-52.258622784, -14, 2.5),
        (-99.741377216, -14, 2.5),
        (-43, -12.422499667, 2.5),
        (-43, 12.422499667, 2.5),
        (-4.845179595, 0, 2.5),
        (99.741377216, -14, 2.5),
        (52.258622784, -14, 2.5),
        (76, -1.689656258, 2.5),
        (99.741377216, 14, 2.5),
        (76, 1.689656258, 2.5),
        (52.258622784, 14, 2.5),
        (103, -12.310343742, 2.5),
        (79.258622784, 0, 2.5),
        (103, 12.310343742, 2.5),
        (-99.741377216, 14, 2.5),
        (-52.258622784, 14, 2.5),
        (-76, 1.689656258, 2.5),
    ]]
    fillet(fillet_1_edges, radius=FILLET_1_R)


solid = part.part
